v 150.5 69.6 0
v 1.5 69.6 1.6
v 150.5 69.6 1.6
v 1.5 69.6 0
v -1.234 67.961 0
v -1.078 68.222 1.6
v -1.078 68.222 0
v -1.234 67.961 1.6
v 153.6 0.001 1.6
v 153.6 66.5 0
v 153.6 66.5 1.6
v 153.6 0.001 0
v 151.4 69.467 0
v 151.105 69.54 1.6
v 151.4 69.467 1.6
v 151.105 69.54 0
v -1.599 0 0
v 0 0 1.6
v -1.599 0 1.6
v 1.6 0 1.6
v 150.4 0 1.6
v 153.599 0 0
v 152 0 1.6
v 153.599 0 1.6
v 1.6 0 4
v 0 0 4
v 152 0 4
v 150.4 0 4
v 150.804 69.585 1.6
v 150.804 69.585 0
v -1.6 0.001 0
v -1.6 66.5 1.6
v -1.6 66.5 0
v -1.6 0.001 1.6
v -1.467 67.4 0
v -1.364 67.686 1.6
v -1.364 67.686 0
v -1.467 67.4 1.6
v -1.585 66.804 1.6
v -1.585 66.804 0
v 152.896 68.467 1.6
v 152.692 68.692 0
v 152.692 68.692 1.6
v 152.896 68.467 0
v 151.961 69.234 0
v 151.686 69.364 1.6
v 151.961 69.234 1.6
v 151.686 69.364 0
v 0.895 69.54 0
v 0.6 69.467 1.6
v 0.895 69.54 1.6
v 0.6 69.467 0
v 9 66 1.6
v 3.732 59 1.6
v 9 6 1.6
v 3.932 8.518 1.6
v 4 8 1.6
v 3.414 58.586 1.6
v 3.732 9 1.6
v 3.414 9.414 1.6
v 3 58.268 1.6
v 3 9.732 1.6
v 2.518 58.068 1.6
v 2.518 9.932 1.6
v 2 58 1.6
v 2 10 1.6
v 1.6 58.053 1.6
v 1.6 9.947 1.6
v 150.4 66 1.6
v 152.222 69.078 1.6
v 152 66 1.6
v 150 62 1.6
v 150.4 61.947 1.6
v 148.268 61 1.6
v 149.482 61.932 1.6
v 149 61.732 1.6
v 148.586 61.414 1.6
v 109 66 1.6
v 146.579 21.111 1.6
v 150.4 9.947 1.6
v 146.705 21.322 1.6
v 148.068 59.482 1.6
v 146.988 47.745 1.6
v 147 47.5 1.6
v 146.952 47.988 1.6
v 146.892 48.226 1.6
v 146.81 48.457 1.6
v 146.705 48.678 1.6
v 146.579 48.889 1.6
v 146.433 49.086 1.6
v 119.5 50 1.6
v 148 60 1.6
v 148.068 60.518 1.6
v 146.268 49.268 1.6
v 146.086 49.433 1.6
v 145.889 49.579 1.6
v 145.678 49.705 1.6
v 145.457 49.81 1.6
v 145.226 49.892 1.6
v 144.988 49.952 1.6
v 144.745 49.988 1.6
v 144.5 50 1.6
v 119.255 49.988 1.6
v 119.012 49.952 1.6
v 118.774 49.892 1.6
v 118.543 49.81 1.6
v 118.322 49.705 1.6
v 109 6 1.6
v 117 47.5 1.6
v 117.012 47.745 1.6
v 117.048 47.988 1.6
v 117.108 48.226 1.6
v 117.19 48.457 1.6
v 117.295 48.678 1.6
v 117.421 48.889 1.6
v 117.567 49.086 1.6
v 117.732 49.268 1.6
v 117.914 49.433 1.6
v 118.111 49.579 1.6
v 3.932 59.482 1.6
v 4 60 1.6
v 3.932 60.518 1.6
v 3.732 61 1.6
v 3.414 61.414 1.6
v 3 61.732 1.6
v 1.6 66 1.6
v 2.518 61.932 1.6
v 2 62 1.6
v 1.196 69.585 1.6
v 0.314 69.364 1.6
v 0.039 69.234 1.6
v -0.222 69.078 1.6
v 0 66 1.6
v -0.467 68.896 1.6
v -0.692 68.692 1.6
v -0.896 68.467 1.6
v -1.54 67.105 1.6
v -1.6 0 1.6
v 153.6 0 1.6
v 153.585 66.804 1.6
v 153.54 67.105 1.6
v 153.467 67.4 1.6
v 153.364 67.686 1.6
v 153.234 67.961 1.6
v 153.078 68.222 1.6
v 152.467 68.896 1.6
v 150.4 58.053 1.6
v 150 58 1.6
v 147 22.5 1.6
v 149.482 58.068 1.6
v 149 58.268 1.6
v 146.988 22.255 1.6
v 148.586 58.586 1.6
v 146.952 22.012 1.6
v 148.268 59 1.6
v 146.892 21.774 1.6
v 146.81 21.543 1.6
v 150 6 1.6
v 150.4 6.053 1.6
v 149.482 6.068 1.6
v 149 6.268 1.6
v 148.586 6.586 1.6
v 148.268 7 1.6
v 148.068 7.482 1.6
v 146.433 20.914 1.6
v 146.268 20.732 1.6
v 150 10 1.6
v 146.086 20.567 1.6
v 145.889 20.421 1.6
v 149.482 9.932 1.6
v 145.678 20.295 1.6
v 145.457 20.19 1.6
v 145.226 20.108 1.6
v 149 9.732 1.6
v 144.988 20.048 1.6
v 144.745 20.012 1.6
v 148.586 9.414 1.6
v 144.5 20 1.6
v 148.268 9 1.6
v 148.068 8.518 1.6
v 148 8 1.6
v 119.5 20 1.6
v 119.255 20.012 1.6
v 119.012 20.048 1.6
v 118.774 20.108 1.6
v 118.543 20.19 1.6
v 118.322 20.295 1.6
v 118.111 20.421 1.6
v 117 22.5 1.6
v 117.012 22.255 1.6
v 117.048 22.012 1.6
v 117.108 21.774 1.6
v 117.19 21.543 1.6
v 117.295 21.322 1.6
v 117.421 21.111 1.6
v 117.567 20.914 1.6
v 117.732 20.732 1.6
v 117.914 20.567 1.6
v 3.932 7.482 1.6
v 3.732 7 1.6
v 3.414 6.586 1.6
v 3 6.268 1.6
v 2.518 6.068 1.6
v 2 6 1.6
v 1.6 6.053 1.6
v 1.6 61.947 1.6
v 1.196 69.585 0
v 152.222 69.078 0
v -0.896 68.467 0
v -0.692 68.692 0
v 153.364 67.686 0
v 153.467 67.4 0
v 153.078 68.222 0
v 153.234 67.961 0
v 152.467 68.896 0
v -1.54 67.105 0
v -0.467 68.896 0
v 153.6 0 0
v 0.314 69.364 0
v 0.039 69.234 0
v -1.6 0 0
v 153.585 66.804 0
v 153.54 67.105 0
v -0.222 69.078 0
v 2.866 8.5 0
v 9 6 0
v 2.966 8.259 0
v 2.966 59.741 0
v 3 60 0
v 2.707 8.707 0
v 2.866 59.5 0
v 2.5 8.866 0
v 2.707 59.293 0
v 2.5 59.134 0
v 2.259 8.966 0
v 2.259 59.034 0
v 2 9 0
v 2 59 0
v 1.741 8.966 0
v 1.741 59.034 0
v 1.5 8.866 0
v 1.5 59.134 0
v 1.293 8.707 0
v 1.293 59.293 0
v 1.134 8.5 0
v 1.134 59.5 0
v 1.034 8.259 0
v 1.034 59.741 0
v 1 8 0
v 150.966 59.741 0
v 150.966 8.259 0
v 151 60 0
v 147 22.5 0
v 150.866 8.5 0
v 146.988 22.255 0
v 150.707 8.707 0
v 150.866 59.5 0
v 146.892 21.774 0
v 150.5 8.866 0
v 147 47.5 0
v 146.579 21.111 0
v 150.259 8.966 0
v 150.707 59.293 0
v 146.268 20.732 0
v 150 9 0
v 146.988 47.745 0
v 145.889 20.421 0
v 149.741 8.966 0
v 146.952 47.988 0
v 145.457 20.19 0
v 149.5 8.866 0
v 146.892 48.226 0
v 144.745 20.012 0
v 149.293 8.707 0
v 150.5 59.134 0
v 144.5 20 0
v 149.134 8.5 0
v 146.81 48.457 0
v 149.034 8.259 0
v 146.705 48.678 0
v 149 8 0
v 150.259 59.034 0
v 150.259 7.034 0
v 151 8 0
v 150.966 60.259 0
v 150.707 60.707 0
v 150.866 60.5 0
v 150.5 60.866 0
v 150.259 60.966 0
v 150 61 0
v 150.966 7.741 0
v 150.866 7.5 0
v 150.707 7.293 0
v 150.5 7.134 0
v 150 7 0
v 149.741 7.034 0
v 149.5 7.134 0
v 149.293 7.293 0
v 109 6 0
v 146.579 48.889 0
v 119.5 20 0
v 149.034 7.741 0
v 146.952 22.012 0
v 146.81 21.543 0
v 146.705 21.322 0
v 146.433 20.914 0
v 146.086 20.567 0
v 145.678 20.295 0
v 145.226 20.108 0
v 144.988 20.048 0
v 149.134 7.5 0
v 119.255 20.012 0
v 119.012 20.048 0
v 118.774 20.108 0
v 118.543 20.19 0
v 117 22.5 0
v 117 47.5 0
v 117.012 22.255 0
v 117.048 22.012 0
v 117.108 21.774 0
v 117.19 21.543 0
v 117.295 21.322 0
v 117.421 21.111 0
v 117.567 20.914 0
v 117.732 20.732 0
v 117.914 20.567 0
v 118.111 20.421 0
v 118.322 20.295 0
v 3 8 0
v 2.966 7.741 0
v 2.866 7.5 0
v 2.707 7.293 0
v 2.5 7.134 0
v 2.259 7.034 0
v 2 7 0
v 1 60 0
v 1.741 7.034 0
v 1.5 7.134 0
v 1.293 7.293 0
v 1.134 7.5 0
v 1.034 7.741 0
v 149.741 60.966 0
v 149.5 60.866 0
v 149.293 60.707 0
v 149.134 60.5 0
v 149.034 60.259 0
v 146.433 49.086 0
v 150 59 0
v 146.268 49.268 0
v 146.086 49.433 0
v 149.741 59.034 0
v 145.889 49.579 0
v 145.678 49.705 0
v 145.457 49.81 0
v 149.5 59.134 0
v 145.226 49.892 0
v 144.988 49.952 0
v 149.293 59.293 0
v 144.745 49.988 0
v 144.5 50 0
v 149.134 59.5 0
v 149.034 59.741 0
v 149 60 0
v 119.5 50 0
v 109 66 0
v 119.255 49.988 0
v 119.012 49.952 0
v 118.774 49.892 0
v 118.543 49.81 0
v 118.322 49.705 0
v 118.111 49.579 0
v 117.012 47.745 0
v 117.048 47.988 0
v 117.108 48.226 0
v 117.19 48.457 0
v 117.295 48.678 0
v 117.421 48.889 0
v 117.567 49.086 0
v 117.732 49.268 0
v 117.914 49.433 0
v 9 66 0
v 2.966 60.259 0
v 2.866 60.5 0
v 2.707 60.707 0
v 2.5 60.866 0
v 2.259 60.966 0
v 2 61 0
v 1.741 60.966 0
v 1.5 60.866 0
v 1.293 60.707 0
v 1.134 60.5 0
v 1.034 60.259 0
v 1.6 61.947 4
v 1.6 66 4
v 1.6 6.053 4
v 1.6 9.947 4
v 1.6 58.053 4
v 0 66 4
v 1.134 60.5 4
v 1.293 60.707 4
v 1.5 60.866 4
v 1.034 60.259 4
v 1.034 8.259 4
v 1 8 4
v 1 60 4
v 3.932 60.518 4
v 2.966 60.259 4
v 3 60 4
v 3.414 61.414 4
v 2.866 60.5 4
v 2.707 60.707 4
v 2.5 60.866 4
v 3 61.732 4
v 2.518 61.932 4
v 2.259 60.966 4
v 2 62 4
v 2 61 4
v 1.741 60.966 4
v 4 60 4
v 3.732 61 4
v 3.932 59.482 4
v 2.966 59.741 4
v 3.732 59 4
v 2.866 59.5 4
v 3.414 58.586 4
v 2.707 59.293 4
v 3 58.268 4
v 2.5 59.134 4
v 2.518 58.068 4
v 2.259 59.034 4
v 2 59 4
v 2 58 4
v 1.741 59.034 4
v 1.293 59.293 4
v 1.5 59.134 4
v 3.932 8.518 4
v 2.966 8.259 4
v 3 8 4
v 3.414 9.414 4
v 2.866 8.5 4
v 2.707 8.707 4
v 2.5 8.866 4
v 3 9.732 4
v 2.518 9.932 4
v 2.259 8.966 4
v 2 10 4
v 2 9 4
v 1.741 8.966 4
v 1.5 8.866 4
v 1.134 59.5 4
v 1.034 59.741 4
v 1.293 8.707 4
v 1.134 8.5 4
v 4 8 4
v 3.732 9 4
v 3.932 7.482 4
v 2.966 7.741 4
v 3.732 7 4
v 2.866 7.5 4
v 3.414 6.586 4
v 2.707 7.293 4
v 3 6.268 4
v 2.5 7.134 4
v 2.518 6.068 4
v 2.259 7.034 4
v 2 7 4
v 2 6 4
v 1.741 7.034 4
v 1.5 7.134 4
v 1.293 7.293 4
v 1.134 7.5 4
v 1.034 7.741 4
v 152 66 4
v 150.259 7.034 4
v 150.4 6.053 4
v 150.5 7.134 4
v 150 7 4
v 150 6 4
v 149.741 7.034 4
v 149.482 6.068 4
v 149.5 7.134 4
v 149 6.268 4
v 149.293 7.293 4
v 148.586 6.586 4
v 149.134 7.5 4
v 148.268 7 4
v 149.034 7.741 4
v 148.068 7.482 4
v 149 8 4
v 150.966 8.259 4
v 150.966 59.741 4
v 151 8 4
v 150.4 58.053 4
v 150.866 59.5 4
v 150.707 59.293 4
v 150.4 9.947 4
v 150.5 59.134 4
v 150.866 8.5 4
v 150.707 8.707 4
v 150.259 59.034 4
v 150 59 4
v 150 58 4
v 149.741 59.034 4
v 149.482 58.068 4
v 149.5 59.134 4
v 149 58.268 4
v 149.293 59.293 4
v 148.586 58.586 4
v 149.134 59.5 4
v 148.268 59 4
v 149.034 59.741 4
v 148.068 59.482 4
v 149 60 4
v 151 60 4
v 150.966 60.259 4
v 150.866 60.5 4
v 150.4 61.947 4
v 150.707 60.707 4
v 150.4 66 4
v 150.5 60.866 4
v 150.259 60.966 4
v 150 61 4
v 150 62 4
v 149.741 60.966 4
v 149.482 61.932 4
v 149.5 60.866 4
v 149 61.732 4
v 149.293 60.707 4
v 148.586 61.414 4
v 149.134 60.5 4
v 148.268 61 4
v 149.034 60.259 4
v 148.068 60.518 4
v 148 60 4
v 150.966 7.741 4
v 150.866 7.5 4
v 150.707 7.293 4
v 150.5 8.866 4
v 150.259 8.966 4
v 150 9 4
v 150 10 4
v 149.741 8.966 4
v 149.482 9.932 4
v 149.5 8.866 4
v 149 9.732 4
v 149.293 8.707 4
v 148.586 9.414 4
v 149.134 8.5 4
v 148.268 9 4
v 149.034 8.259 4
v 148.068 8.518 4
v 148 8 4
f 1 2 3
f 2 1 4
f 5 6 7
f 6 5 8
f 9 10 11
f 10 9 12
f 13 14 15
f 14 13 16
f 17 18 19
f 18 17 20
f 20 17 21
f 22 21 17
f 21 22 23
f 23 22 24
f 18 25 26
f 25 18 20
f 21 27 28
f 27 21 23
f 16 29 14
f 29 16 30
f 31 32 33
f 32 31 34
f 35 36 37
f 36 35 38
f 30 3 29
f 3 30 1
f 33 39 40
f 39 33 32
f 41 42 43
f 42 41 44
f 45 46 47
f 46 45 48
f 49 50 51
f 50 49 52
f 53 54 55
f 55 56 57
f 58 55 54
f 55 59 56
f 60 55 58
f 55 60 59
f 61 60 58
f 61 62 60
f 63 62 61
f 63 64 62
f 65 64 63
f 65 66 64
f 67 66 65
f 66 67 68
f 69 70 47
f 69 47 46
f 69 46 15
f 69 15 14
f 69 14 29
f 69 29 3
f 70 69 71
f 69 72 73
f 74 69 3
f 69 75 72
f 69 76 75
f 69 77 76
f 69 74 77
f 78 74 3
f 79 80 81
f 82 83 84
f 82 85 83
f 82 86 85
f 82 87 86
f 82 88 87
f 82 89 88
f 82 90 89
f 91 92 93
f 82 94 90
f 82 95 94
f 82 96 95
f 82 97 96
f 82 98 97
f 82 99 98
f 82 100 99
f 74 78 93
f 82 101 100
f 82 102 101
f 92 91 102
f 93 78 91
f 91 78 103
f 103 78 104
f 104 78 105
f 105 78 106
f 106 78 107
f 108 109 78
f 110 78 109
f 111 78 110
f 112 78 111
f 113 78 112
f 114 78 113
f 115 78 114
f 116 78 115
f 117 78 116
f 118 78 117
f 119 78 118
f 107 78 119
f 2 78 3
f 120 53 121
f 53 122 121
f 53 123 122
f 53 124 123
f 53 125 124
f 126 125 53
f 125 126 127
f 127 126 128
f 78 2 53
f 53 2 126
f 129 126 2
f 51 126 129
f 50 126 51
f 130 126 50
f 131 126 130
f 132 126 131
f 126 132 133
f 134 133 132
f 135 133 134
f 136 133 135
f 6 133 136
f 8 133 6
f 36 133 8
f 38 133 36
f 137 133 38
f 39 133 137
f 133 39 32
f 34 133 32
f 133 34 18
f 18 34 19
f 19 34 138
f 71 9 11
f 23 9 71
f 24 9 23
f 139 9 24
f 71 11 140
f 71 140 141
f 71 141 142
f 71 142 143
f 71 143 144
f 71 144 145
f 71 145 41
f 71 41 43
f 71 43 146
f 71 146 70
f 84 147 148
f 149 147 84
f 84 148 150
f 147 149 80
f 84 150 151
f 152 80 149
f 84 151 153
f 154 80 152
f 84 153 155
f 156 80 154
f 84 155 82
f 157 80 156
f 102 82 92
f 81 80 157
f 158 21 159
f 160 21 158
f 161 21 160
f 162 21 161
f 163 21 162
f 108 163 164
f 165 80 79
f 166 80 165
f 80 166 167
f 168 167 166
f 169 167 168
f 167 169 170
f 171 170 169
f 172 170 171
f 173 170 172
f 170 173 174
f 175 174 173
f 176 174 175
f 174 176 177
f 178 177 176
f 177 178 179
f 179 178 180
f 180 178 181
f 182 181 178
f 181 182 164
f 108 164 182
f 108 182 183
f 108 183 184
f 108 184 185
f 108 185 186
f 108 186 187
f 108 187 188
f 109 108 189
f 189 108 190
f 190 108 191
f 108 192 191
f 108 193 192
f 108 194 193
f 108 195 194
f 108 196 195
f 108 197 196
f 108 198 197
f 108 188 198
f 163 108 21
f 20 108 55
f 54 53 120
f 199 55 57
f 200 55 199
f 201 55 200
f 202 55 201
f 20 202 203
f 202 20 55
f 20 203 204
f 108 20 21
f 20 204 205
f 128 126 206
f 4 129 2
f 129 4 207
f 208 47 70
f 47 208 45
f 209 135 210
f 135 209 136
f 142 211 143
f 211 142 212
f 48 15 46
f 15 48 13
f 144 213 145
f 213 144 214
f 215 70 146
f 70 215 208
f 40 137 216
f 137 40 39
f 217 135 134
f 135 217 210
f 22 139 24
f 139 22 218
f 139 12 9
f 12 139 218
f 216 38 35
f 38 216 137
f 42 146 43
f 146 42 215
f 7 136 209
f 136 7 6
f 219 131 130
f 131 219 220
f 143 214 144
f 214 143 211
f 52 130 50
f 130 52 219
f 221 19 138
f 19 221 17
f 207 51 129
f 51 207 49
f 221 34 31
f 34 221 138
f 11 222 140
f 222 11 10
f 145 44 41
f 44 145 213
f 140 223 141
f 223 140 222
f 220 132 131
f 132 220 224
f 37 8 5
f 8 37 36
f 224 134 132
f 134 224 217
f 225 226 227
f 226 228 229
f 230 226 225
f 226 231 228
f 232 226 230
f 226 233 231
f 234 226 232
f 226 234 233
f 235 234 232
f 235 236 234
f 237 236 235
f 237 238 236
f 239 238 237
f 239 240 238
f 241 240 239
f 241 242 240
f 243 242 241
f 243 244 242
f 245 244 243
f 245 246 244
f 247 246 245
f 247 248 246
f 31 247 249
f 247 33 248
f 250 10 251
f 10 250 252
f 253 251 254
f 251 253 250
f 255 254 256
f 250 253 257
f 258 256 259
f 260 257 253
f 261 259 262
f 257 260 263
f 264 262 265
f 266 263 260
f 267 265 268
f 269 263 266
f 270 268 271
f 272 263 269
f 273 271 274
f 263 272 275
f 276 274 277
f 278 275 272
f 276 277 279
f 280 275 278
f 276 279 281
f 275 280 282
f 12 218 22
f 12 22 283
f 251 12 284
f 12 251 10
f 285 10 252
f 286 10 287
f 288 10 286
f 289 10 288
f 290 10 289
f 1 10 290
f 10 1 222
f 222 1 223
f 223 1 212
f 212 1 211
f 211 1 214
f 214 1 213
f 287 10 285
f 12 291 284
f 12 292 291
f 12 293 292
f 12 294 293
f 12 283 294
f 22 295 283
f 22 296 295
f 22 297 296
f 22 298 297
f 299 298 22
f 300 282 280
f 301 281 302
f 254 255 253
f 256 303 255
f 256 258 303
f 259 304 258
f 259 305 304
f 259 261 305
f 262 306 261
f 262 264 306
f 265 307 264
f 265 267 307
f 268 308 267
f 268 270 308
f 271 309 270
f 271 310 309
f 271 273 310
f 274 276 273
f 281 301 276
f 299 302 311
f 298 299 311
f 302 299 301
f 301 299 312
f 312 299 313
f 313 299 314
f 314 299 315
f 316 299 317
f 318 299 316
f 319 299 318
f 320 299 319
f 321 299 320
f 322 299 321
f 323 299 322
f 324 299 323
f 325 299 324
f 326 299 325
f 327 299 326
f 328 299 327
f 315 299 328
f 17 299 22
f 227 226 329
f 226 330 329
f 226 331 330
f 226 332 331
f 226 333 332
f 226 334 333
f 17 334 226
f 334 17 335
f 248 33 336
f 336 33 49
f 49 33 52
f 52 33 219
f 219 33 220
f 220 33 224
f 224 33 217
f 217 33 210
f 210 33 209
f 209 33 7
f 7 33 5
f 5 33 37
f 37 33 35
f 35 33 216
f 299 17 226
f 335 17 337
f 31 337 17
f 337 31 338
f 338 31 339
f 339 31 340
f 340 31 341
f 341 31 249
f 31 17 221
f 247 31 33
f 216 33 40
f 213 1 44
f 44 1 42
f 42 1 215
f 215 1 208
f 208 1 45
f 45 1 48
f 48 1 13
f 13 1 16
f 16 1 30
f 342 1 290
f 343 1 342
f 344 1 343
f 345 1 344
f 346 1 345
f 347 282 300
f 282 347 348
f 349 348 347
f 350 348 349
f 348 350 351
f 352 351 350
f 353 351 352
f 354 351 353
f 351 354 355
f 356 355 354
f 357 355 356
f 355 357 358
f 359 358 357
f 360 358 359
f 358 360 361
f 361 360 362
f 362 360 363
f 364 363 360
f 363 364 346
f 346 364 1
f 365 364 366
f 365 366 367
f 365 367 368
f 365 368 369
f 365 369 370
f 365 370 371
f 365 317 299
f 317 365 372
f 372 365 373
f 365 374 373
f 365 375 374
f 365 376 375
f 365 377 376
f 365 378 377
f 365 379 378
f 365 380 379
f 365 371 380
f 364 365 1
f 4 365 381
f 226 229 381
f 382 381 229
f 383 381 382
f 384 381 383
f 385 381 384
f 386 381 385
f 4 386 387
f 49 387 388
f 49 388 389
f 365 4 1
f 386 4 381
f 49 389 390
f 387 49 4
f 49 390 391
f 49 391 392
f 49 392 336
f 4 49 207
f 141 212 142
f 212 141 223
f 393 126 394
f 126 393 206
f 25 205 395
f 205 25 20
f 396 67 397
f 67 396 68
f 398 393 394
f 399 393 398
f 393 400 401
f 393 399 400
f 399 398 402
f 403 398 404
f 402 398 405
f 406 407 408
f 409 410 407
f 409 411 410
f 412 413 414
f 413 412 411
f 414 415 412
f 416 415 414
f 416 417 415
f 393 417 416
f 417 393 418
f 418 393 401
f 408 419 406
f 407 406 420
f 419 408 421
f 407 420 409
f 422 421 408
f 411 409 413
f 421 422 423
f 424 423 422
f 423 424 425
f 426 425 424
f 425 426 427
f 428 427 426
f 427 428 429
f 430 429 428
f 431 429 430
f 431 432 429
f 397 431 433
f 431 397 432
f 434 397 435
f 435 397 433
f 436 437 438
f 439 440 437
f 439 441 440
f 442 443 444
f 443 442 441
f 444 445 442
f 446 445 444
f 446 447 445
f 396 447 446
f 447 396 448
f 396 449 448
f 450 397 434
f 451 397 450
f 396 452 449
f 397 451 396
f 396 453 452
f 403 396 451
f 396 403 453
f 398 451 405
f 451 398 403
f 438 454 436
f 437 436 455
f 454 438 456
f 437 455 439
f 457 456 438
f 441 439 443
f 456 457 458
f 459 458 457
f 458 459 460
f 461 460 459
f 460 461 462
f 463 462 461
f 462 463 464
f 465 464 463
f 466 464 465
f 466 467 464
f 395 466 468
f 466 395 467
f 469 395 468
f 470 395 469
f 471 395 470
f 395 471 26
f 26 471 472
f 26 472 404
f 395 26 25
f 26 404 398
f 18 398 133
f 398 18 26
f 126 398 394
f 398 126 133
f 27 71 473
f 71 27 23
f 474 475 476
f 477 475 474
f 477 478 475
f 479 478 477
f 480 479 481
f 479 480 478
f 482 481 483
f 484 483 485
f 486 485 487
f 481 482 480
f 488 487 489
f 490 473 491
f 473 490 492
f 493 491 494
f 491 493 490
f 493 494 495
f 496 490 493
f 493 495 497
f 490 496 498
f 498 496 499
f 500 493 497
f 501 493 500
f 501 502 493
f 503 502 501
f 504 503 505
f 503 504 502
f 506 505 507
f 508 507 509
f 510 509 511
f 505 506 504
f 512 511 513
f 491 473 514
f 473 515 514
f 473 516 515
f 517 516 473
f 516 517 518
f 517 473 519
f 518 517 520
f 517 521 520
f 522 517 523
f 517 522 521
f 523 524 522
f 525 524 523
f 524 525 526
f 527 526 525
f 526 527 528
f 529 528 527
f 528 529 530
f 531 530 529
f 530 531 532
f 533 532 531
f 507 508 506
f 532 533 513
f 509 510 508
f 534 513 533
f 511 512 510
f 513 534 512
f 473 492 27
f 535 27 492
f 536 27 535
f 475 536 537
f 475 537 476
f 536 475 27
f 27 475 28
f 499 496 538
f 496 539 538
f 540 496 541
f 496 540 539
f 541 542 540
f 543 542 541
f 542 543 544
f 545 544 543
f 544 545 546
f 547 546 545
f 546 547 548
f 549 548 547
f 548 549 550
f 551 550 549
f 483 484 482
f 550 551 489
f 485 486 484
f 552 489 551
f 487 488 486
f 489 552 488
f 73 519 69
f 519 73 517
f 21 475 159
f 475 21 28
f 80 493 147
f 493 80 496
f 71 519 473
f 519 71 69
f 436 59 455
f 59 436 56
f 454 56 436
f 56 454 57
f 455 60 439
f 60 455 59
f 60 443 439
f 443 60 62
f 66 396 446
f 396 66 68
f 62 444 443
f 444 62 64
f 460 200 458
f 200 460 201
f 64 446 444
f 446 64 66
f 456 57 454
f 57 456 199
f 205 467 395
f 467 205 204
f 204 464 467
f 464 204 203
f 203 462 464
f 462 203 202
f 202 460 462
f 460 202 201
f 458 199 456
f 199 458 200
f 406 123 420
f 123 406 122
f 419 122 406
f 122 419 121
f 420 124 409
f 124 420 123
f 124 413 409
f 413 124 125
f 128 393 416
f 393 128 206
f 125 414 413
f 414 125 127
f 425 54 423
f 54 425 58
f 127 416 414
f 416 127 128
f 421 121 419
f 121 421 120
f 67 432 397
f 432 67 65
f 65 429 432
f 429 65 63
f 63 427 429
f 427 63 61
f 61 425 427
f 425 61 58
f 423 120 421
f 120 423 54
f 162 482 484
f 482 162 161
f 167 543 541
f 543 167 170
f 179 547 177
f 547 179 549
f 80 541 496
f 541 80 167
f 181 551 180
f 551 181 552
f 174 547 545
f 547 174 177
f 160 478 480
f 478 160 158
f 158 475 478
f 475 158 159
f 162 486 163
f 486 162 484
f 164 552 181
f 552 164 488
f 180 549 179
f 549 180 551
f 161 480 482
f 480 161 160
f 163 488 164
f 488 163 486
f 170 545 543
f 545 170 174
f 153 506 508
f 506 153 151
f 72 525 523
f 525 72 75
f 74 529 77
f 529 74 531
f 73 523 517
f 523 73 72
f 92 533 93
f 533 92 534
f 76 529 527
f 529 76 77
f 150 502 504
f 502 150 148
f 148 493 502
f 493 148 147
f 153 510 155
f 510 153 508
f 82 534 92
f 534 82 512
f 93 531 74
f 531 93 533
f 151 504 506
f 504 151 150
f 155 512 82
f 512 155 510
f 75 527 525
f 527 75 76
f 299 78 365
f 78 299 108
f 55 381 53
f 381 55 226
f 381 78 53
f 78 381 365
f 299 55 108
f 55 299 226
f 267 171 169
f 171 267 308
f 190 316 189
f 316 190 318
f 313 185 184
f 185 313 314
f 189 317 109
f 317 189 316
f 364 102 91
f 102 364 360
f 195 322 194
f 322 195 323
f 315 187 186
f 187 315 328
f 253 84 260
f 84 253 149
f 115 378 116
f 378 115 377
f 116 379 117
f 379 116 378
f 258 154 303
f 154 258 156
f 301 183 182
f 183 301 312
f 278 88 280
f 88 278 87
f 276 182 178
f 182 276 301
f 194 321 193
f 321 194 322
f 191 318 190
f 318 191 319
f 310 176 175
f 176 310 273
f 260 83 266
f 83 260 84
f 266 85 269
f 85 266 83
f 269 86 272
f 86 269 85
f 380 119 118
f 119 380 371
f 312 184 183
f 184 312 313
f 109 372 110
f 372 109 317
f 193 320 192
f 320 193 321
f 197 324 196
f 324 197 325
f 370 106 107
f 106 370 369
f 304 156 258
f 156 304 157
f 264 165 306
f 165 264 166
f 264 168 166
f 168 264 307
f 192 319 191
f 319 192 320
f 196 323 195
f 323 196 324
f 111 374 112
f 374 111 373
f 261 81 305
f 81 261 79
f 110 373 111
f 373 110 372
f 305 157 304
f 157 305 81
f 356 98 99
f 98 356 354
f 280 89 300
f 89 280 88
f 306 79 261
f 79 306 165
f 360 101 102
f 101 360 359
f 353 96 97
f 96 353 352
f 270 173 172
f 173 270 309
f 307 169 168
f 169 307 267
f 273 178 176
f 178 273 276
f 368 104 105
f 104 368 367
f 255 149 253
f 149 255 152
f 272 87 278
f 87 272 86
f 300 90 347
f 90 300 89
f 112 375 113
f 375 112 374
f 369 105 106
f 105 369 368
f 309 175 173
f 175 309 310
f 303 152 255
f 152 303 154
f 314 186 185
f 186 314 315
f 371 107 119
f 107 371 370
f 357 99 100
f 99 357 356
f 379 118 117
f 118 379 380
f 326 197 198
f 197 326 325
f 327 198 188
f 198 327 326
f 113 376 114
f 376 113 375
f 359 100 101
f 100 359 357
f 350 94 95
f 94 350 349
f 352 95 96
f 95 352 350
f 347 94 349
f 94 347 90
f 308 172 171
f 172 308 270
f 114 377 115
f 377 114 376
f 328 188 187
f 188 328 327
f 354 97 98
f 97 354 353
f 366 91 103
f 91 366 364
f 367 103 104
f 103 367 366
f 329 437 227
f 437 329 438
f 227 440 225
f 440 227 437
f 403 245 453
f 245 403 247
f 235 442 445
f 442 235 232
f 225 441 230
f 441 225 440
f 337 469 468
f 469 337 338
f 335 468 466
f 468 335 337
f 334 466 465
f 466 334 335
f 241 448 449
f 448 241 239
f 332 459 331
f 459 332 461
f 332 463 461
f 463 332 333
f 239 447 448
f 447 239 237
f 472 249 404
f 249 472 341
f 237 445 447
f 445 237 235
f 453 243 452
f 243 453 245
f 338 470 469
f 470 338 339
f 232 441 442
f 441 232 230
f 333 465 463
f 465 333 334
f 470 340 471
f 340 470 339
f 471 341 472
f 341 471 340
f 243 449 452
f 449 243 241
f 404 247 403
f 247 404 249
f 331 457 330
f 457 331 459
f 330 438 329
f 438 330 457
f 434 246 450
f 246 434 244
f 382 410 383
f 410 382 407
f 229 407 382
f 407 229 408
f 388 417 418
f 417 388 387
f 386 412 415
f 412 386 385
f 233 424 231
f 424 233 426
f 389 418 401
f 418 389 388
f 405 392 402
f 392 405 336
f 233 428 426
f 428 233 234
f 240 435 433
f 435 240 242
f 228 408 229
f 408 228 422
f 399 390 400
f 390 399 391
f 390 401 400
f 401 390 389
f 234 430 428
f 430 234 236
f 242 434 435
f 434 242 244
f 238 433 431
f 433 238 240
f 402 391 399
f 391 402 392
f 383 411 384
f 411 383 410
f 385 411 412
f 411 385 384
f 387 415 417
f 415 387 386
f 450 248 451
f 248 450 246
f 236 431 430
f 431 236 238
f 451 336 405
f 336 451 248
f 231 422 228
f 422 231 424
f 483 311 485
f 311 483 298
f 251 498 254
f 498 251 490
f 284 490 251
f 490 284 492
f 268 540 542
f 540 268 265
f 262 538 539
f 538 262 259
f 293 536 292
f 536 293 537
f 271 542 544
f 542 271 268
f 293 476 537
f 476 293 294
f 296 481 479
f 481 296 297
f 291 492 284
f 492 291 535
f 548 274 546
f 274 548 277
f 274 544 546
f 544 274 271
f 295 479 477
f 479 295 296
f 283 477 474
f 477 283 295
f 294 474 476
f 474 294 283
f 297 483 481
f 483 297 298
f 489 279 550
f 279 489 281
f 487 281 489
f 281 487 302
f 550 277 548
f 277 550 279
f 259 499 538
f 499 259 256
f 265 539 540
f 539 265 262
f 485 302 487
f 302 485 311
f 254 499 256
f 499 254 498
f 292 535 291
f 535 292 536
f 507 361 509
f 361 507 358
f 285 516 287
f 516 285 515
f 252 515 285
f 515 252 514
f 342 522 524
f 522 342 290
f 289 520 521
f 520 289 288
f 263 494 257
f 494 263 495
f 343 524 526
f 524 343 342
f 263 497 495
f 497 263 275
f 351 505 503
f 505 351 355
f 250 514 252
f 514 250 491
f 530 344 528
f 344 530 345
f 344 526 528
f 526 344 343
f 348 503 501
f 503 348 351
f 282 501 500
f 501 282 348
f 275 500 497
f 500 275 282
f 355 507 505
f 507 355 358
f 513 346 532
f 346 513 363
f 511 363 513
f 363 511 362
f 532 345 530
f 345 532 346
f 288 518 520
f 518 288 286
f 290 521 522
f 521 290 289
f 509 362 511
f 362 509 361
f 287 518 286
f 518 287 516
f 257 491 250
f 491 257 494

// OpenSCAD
// file: constants.scad
// All lengths in millimeters

BATTERY_LENGTH = 71.50;
BATTERY_THICKNESS = 16.20;
BATTERY_WIDTH = 152.00;

KEYBOARD_THICKNESS = 12.00;
KEYBOARD_WIDTH = 153.00;
KEYBOARD_LENGTH = 59.00;

WALL_THICKNESS = 1.60;

RPI_BOTTOM_CLEARANCE = 2.3;
RPI_PCB_THICKNESS = 1.5;
RPI_LENGTH = 56.50;
RPI_HOLE_HEIGHT = RPI_BOTTOM_CLEARANCE + RPI_PCB_THICKNESS;

BOX_WIDTH = BATTERY_WIDTH;
BOX_LENGTH = BATTERY_LENGTH + RPI_LENGTH;
BOX_HEIGHT = BATTERY_THICKNESS + KEYBOARD_THICKNESS;
BOX_DIMENSIONS = [BOX_WIDTH, BOX_LENGTH, BOX_HEIGHT];
BOX_CORNERS = [1.5, 1.5, 6, 8];

DISPLAY_WIDTH = 106;
DISPLAY_LENGTH = 68;
DISPLAY_SUPPORT_RAD = 3;

module round_prism(dimensions, radii) {
  assert(is_list(dimensions) && len(dimensions) == 3, "'dimensions' must be of the pattern [w, l, h]!");
  assert(is_list(radii) && len(radii) == 4, "'radii' must be of the pattern [fl, fr, bl, br]!");
  w = dimensions[0];
  l = dimensions[1];
  h = dimensions[2];
  eps = 0.001;
  fl = max(radii[0], eps);
  fr = max(radii[1], eps);
  bl = max(radii[2], eps);
  br = max(radii[3], eps);

  fn = 64;
  hull() {
    translate([bl, bl, 0]) cylinder(h, r=bl, $fn=fn); // bl
    translate([w-br, br, 0]) cylinder(h, r=br, $fn=fn); // br
    translate([fl, l-fl, 0]) cylinder(h, r=fl, $fn=fn); // fl
    translate([w-fr, l-fr, 0]) cylinder(h, r=fr, $fn=fn); // fr
  }
}
// main file
include <constants.scad>

// This was very quickly thrown together, and I definitely could clean it up.
// But I won't right now. I think it'll work.

LID_LENGTH = DISPLAY_LENGTH;
FAN_WIDTH = 30;
RAIL_HEIGHT = 4;

module lid() {
  difference() {
    union() {
      // Main slab
      translate([-WALL_THICKNESS, 0, 0])
        round_prism(
          [BOX_WIDTH + WALL_THICKNESS*2, LID_LENGTH + WALL_THICKNESS, WALL_THICKNESS],
          [BOX_CORNERS[0]+WALL_THICKNESS, BOX_CORNERS[1]+WALL_THICKNESS, 0, 0]
        );

      // Rails
      cube([WALL_THICKNESS, LID_LENGTH - 2, RAIL_HEIGHT]);
      translate([BOX_WIDTH - WALL_THICKNESS, 0, 0]) cube([WALL_THICKNESS, LID_LENGTH - 2, RAIL_HEIGHT]);

      // Cylinders for screw holes
      translate([2, 8, 0]) cylinder(RAIL_HEIGHT, r=2, $fn=24);
      translate([2, DISPLAY_LENGTH - 8, 0]) cylinder(RAIL_HEIGHT, r=2, $fn=24);
      translate([BOX_WIDTH - 2, 8, 0]) cylinder(RAIL_HEIGHT, r=2, $fn=24);
      translate([BOX_WIDTH - 2, DISPLAY_LENGTH - 8, 0]) cylinder(RAIL_HEIGHT, r=2, $fn=24);
    }
    // Window for display
    translate([9, 6, 0]) cube([100, 60, WALL_THICKNESS]);
    // Hole for fan
    translate([117, 20, 0]) round_prism([FAN_WIDTH, FAN_WIDTH, WALL_THICKNESS], [2.5, 2.5, 2.5, 2.5]);

    // Screw holes
    translate([2, 8, 0]) cylinder(RAIL_HEIGHT, r=1, $fn=24);
    translate([2, DISPLAY_LENGTH - 8, 0]) cylinder(RAIL_HEIGHT, r=1, $fn=24);
    translate([BOX_WIDTH - 2, 8, 0]) cylinder(RAIL_HEIGHT, r=1, $fn=24);
    translate([BOX_WIDTH - 2, DISPLAY_LENGTH - 8, 0]) cylinder(RAIL_HEIGHT, r=1, $fn=24);
  }
}

lid();
